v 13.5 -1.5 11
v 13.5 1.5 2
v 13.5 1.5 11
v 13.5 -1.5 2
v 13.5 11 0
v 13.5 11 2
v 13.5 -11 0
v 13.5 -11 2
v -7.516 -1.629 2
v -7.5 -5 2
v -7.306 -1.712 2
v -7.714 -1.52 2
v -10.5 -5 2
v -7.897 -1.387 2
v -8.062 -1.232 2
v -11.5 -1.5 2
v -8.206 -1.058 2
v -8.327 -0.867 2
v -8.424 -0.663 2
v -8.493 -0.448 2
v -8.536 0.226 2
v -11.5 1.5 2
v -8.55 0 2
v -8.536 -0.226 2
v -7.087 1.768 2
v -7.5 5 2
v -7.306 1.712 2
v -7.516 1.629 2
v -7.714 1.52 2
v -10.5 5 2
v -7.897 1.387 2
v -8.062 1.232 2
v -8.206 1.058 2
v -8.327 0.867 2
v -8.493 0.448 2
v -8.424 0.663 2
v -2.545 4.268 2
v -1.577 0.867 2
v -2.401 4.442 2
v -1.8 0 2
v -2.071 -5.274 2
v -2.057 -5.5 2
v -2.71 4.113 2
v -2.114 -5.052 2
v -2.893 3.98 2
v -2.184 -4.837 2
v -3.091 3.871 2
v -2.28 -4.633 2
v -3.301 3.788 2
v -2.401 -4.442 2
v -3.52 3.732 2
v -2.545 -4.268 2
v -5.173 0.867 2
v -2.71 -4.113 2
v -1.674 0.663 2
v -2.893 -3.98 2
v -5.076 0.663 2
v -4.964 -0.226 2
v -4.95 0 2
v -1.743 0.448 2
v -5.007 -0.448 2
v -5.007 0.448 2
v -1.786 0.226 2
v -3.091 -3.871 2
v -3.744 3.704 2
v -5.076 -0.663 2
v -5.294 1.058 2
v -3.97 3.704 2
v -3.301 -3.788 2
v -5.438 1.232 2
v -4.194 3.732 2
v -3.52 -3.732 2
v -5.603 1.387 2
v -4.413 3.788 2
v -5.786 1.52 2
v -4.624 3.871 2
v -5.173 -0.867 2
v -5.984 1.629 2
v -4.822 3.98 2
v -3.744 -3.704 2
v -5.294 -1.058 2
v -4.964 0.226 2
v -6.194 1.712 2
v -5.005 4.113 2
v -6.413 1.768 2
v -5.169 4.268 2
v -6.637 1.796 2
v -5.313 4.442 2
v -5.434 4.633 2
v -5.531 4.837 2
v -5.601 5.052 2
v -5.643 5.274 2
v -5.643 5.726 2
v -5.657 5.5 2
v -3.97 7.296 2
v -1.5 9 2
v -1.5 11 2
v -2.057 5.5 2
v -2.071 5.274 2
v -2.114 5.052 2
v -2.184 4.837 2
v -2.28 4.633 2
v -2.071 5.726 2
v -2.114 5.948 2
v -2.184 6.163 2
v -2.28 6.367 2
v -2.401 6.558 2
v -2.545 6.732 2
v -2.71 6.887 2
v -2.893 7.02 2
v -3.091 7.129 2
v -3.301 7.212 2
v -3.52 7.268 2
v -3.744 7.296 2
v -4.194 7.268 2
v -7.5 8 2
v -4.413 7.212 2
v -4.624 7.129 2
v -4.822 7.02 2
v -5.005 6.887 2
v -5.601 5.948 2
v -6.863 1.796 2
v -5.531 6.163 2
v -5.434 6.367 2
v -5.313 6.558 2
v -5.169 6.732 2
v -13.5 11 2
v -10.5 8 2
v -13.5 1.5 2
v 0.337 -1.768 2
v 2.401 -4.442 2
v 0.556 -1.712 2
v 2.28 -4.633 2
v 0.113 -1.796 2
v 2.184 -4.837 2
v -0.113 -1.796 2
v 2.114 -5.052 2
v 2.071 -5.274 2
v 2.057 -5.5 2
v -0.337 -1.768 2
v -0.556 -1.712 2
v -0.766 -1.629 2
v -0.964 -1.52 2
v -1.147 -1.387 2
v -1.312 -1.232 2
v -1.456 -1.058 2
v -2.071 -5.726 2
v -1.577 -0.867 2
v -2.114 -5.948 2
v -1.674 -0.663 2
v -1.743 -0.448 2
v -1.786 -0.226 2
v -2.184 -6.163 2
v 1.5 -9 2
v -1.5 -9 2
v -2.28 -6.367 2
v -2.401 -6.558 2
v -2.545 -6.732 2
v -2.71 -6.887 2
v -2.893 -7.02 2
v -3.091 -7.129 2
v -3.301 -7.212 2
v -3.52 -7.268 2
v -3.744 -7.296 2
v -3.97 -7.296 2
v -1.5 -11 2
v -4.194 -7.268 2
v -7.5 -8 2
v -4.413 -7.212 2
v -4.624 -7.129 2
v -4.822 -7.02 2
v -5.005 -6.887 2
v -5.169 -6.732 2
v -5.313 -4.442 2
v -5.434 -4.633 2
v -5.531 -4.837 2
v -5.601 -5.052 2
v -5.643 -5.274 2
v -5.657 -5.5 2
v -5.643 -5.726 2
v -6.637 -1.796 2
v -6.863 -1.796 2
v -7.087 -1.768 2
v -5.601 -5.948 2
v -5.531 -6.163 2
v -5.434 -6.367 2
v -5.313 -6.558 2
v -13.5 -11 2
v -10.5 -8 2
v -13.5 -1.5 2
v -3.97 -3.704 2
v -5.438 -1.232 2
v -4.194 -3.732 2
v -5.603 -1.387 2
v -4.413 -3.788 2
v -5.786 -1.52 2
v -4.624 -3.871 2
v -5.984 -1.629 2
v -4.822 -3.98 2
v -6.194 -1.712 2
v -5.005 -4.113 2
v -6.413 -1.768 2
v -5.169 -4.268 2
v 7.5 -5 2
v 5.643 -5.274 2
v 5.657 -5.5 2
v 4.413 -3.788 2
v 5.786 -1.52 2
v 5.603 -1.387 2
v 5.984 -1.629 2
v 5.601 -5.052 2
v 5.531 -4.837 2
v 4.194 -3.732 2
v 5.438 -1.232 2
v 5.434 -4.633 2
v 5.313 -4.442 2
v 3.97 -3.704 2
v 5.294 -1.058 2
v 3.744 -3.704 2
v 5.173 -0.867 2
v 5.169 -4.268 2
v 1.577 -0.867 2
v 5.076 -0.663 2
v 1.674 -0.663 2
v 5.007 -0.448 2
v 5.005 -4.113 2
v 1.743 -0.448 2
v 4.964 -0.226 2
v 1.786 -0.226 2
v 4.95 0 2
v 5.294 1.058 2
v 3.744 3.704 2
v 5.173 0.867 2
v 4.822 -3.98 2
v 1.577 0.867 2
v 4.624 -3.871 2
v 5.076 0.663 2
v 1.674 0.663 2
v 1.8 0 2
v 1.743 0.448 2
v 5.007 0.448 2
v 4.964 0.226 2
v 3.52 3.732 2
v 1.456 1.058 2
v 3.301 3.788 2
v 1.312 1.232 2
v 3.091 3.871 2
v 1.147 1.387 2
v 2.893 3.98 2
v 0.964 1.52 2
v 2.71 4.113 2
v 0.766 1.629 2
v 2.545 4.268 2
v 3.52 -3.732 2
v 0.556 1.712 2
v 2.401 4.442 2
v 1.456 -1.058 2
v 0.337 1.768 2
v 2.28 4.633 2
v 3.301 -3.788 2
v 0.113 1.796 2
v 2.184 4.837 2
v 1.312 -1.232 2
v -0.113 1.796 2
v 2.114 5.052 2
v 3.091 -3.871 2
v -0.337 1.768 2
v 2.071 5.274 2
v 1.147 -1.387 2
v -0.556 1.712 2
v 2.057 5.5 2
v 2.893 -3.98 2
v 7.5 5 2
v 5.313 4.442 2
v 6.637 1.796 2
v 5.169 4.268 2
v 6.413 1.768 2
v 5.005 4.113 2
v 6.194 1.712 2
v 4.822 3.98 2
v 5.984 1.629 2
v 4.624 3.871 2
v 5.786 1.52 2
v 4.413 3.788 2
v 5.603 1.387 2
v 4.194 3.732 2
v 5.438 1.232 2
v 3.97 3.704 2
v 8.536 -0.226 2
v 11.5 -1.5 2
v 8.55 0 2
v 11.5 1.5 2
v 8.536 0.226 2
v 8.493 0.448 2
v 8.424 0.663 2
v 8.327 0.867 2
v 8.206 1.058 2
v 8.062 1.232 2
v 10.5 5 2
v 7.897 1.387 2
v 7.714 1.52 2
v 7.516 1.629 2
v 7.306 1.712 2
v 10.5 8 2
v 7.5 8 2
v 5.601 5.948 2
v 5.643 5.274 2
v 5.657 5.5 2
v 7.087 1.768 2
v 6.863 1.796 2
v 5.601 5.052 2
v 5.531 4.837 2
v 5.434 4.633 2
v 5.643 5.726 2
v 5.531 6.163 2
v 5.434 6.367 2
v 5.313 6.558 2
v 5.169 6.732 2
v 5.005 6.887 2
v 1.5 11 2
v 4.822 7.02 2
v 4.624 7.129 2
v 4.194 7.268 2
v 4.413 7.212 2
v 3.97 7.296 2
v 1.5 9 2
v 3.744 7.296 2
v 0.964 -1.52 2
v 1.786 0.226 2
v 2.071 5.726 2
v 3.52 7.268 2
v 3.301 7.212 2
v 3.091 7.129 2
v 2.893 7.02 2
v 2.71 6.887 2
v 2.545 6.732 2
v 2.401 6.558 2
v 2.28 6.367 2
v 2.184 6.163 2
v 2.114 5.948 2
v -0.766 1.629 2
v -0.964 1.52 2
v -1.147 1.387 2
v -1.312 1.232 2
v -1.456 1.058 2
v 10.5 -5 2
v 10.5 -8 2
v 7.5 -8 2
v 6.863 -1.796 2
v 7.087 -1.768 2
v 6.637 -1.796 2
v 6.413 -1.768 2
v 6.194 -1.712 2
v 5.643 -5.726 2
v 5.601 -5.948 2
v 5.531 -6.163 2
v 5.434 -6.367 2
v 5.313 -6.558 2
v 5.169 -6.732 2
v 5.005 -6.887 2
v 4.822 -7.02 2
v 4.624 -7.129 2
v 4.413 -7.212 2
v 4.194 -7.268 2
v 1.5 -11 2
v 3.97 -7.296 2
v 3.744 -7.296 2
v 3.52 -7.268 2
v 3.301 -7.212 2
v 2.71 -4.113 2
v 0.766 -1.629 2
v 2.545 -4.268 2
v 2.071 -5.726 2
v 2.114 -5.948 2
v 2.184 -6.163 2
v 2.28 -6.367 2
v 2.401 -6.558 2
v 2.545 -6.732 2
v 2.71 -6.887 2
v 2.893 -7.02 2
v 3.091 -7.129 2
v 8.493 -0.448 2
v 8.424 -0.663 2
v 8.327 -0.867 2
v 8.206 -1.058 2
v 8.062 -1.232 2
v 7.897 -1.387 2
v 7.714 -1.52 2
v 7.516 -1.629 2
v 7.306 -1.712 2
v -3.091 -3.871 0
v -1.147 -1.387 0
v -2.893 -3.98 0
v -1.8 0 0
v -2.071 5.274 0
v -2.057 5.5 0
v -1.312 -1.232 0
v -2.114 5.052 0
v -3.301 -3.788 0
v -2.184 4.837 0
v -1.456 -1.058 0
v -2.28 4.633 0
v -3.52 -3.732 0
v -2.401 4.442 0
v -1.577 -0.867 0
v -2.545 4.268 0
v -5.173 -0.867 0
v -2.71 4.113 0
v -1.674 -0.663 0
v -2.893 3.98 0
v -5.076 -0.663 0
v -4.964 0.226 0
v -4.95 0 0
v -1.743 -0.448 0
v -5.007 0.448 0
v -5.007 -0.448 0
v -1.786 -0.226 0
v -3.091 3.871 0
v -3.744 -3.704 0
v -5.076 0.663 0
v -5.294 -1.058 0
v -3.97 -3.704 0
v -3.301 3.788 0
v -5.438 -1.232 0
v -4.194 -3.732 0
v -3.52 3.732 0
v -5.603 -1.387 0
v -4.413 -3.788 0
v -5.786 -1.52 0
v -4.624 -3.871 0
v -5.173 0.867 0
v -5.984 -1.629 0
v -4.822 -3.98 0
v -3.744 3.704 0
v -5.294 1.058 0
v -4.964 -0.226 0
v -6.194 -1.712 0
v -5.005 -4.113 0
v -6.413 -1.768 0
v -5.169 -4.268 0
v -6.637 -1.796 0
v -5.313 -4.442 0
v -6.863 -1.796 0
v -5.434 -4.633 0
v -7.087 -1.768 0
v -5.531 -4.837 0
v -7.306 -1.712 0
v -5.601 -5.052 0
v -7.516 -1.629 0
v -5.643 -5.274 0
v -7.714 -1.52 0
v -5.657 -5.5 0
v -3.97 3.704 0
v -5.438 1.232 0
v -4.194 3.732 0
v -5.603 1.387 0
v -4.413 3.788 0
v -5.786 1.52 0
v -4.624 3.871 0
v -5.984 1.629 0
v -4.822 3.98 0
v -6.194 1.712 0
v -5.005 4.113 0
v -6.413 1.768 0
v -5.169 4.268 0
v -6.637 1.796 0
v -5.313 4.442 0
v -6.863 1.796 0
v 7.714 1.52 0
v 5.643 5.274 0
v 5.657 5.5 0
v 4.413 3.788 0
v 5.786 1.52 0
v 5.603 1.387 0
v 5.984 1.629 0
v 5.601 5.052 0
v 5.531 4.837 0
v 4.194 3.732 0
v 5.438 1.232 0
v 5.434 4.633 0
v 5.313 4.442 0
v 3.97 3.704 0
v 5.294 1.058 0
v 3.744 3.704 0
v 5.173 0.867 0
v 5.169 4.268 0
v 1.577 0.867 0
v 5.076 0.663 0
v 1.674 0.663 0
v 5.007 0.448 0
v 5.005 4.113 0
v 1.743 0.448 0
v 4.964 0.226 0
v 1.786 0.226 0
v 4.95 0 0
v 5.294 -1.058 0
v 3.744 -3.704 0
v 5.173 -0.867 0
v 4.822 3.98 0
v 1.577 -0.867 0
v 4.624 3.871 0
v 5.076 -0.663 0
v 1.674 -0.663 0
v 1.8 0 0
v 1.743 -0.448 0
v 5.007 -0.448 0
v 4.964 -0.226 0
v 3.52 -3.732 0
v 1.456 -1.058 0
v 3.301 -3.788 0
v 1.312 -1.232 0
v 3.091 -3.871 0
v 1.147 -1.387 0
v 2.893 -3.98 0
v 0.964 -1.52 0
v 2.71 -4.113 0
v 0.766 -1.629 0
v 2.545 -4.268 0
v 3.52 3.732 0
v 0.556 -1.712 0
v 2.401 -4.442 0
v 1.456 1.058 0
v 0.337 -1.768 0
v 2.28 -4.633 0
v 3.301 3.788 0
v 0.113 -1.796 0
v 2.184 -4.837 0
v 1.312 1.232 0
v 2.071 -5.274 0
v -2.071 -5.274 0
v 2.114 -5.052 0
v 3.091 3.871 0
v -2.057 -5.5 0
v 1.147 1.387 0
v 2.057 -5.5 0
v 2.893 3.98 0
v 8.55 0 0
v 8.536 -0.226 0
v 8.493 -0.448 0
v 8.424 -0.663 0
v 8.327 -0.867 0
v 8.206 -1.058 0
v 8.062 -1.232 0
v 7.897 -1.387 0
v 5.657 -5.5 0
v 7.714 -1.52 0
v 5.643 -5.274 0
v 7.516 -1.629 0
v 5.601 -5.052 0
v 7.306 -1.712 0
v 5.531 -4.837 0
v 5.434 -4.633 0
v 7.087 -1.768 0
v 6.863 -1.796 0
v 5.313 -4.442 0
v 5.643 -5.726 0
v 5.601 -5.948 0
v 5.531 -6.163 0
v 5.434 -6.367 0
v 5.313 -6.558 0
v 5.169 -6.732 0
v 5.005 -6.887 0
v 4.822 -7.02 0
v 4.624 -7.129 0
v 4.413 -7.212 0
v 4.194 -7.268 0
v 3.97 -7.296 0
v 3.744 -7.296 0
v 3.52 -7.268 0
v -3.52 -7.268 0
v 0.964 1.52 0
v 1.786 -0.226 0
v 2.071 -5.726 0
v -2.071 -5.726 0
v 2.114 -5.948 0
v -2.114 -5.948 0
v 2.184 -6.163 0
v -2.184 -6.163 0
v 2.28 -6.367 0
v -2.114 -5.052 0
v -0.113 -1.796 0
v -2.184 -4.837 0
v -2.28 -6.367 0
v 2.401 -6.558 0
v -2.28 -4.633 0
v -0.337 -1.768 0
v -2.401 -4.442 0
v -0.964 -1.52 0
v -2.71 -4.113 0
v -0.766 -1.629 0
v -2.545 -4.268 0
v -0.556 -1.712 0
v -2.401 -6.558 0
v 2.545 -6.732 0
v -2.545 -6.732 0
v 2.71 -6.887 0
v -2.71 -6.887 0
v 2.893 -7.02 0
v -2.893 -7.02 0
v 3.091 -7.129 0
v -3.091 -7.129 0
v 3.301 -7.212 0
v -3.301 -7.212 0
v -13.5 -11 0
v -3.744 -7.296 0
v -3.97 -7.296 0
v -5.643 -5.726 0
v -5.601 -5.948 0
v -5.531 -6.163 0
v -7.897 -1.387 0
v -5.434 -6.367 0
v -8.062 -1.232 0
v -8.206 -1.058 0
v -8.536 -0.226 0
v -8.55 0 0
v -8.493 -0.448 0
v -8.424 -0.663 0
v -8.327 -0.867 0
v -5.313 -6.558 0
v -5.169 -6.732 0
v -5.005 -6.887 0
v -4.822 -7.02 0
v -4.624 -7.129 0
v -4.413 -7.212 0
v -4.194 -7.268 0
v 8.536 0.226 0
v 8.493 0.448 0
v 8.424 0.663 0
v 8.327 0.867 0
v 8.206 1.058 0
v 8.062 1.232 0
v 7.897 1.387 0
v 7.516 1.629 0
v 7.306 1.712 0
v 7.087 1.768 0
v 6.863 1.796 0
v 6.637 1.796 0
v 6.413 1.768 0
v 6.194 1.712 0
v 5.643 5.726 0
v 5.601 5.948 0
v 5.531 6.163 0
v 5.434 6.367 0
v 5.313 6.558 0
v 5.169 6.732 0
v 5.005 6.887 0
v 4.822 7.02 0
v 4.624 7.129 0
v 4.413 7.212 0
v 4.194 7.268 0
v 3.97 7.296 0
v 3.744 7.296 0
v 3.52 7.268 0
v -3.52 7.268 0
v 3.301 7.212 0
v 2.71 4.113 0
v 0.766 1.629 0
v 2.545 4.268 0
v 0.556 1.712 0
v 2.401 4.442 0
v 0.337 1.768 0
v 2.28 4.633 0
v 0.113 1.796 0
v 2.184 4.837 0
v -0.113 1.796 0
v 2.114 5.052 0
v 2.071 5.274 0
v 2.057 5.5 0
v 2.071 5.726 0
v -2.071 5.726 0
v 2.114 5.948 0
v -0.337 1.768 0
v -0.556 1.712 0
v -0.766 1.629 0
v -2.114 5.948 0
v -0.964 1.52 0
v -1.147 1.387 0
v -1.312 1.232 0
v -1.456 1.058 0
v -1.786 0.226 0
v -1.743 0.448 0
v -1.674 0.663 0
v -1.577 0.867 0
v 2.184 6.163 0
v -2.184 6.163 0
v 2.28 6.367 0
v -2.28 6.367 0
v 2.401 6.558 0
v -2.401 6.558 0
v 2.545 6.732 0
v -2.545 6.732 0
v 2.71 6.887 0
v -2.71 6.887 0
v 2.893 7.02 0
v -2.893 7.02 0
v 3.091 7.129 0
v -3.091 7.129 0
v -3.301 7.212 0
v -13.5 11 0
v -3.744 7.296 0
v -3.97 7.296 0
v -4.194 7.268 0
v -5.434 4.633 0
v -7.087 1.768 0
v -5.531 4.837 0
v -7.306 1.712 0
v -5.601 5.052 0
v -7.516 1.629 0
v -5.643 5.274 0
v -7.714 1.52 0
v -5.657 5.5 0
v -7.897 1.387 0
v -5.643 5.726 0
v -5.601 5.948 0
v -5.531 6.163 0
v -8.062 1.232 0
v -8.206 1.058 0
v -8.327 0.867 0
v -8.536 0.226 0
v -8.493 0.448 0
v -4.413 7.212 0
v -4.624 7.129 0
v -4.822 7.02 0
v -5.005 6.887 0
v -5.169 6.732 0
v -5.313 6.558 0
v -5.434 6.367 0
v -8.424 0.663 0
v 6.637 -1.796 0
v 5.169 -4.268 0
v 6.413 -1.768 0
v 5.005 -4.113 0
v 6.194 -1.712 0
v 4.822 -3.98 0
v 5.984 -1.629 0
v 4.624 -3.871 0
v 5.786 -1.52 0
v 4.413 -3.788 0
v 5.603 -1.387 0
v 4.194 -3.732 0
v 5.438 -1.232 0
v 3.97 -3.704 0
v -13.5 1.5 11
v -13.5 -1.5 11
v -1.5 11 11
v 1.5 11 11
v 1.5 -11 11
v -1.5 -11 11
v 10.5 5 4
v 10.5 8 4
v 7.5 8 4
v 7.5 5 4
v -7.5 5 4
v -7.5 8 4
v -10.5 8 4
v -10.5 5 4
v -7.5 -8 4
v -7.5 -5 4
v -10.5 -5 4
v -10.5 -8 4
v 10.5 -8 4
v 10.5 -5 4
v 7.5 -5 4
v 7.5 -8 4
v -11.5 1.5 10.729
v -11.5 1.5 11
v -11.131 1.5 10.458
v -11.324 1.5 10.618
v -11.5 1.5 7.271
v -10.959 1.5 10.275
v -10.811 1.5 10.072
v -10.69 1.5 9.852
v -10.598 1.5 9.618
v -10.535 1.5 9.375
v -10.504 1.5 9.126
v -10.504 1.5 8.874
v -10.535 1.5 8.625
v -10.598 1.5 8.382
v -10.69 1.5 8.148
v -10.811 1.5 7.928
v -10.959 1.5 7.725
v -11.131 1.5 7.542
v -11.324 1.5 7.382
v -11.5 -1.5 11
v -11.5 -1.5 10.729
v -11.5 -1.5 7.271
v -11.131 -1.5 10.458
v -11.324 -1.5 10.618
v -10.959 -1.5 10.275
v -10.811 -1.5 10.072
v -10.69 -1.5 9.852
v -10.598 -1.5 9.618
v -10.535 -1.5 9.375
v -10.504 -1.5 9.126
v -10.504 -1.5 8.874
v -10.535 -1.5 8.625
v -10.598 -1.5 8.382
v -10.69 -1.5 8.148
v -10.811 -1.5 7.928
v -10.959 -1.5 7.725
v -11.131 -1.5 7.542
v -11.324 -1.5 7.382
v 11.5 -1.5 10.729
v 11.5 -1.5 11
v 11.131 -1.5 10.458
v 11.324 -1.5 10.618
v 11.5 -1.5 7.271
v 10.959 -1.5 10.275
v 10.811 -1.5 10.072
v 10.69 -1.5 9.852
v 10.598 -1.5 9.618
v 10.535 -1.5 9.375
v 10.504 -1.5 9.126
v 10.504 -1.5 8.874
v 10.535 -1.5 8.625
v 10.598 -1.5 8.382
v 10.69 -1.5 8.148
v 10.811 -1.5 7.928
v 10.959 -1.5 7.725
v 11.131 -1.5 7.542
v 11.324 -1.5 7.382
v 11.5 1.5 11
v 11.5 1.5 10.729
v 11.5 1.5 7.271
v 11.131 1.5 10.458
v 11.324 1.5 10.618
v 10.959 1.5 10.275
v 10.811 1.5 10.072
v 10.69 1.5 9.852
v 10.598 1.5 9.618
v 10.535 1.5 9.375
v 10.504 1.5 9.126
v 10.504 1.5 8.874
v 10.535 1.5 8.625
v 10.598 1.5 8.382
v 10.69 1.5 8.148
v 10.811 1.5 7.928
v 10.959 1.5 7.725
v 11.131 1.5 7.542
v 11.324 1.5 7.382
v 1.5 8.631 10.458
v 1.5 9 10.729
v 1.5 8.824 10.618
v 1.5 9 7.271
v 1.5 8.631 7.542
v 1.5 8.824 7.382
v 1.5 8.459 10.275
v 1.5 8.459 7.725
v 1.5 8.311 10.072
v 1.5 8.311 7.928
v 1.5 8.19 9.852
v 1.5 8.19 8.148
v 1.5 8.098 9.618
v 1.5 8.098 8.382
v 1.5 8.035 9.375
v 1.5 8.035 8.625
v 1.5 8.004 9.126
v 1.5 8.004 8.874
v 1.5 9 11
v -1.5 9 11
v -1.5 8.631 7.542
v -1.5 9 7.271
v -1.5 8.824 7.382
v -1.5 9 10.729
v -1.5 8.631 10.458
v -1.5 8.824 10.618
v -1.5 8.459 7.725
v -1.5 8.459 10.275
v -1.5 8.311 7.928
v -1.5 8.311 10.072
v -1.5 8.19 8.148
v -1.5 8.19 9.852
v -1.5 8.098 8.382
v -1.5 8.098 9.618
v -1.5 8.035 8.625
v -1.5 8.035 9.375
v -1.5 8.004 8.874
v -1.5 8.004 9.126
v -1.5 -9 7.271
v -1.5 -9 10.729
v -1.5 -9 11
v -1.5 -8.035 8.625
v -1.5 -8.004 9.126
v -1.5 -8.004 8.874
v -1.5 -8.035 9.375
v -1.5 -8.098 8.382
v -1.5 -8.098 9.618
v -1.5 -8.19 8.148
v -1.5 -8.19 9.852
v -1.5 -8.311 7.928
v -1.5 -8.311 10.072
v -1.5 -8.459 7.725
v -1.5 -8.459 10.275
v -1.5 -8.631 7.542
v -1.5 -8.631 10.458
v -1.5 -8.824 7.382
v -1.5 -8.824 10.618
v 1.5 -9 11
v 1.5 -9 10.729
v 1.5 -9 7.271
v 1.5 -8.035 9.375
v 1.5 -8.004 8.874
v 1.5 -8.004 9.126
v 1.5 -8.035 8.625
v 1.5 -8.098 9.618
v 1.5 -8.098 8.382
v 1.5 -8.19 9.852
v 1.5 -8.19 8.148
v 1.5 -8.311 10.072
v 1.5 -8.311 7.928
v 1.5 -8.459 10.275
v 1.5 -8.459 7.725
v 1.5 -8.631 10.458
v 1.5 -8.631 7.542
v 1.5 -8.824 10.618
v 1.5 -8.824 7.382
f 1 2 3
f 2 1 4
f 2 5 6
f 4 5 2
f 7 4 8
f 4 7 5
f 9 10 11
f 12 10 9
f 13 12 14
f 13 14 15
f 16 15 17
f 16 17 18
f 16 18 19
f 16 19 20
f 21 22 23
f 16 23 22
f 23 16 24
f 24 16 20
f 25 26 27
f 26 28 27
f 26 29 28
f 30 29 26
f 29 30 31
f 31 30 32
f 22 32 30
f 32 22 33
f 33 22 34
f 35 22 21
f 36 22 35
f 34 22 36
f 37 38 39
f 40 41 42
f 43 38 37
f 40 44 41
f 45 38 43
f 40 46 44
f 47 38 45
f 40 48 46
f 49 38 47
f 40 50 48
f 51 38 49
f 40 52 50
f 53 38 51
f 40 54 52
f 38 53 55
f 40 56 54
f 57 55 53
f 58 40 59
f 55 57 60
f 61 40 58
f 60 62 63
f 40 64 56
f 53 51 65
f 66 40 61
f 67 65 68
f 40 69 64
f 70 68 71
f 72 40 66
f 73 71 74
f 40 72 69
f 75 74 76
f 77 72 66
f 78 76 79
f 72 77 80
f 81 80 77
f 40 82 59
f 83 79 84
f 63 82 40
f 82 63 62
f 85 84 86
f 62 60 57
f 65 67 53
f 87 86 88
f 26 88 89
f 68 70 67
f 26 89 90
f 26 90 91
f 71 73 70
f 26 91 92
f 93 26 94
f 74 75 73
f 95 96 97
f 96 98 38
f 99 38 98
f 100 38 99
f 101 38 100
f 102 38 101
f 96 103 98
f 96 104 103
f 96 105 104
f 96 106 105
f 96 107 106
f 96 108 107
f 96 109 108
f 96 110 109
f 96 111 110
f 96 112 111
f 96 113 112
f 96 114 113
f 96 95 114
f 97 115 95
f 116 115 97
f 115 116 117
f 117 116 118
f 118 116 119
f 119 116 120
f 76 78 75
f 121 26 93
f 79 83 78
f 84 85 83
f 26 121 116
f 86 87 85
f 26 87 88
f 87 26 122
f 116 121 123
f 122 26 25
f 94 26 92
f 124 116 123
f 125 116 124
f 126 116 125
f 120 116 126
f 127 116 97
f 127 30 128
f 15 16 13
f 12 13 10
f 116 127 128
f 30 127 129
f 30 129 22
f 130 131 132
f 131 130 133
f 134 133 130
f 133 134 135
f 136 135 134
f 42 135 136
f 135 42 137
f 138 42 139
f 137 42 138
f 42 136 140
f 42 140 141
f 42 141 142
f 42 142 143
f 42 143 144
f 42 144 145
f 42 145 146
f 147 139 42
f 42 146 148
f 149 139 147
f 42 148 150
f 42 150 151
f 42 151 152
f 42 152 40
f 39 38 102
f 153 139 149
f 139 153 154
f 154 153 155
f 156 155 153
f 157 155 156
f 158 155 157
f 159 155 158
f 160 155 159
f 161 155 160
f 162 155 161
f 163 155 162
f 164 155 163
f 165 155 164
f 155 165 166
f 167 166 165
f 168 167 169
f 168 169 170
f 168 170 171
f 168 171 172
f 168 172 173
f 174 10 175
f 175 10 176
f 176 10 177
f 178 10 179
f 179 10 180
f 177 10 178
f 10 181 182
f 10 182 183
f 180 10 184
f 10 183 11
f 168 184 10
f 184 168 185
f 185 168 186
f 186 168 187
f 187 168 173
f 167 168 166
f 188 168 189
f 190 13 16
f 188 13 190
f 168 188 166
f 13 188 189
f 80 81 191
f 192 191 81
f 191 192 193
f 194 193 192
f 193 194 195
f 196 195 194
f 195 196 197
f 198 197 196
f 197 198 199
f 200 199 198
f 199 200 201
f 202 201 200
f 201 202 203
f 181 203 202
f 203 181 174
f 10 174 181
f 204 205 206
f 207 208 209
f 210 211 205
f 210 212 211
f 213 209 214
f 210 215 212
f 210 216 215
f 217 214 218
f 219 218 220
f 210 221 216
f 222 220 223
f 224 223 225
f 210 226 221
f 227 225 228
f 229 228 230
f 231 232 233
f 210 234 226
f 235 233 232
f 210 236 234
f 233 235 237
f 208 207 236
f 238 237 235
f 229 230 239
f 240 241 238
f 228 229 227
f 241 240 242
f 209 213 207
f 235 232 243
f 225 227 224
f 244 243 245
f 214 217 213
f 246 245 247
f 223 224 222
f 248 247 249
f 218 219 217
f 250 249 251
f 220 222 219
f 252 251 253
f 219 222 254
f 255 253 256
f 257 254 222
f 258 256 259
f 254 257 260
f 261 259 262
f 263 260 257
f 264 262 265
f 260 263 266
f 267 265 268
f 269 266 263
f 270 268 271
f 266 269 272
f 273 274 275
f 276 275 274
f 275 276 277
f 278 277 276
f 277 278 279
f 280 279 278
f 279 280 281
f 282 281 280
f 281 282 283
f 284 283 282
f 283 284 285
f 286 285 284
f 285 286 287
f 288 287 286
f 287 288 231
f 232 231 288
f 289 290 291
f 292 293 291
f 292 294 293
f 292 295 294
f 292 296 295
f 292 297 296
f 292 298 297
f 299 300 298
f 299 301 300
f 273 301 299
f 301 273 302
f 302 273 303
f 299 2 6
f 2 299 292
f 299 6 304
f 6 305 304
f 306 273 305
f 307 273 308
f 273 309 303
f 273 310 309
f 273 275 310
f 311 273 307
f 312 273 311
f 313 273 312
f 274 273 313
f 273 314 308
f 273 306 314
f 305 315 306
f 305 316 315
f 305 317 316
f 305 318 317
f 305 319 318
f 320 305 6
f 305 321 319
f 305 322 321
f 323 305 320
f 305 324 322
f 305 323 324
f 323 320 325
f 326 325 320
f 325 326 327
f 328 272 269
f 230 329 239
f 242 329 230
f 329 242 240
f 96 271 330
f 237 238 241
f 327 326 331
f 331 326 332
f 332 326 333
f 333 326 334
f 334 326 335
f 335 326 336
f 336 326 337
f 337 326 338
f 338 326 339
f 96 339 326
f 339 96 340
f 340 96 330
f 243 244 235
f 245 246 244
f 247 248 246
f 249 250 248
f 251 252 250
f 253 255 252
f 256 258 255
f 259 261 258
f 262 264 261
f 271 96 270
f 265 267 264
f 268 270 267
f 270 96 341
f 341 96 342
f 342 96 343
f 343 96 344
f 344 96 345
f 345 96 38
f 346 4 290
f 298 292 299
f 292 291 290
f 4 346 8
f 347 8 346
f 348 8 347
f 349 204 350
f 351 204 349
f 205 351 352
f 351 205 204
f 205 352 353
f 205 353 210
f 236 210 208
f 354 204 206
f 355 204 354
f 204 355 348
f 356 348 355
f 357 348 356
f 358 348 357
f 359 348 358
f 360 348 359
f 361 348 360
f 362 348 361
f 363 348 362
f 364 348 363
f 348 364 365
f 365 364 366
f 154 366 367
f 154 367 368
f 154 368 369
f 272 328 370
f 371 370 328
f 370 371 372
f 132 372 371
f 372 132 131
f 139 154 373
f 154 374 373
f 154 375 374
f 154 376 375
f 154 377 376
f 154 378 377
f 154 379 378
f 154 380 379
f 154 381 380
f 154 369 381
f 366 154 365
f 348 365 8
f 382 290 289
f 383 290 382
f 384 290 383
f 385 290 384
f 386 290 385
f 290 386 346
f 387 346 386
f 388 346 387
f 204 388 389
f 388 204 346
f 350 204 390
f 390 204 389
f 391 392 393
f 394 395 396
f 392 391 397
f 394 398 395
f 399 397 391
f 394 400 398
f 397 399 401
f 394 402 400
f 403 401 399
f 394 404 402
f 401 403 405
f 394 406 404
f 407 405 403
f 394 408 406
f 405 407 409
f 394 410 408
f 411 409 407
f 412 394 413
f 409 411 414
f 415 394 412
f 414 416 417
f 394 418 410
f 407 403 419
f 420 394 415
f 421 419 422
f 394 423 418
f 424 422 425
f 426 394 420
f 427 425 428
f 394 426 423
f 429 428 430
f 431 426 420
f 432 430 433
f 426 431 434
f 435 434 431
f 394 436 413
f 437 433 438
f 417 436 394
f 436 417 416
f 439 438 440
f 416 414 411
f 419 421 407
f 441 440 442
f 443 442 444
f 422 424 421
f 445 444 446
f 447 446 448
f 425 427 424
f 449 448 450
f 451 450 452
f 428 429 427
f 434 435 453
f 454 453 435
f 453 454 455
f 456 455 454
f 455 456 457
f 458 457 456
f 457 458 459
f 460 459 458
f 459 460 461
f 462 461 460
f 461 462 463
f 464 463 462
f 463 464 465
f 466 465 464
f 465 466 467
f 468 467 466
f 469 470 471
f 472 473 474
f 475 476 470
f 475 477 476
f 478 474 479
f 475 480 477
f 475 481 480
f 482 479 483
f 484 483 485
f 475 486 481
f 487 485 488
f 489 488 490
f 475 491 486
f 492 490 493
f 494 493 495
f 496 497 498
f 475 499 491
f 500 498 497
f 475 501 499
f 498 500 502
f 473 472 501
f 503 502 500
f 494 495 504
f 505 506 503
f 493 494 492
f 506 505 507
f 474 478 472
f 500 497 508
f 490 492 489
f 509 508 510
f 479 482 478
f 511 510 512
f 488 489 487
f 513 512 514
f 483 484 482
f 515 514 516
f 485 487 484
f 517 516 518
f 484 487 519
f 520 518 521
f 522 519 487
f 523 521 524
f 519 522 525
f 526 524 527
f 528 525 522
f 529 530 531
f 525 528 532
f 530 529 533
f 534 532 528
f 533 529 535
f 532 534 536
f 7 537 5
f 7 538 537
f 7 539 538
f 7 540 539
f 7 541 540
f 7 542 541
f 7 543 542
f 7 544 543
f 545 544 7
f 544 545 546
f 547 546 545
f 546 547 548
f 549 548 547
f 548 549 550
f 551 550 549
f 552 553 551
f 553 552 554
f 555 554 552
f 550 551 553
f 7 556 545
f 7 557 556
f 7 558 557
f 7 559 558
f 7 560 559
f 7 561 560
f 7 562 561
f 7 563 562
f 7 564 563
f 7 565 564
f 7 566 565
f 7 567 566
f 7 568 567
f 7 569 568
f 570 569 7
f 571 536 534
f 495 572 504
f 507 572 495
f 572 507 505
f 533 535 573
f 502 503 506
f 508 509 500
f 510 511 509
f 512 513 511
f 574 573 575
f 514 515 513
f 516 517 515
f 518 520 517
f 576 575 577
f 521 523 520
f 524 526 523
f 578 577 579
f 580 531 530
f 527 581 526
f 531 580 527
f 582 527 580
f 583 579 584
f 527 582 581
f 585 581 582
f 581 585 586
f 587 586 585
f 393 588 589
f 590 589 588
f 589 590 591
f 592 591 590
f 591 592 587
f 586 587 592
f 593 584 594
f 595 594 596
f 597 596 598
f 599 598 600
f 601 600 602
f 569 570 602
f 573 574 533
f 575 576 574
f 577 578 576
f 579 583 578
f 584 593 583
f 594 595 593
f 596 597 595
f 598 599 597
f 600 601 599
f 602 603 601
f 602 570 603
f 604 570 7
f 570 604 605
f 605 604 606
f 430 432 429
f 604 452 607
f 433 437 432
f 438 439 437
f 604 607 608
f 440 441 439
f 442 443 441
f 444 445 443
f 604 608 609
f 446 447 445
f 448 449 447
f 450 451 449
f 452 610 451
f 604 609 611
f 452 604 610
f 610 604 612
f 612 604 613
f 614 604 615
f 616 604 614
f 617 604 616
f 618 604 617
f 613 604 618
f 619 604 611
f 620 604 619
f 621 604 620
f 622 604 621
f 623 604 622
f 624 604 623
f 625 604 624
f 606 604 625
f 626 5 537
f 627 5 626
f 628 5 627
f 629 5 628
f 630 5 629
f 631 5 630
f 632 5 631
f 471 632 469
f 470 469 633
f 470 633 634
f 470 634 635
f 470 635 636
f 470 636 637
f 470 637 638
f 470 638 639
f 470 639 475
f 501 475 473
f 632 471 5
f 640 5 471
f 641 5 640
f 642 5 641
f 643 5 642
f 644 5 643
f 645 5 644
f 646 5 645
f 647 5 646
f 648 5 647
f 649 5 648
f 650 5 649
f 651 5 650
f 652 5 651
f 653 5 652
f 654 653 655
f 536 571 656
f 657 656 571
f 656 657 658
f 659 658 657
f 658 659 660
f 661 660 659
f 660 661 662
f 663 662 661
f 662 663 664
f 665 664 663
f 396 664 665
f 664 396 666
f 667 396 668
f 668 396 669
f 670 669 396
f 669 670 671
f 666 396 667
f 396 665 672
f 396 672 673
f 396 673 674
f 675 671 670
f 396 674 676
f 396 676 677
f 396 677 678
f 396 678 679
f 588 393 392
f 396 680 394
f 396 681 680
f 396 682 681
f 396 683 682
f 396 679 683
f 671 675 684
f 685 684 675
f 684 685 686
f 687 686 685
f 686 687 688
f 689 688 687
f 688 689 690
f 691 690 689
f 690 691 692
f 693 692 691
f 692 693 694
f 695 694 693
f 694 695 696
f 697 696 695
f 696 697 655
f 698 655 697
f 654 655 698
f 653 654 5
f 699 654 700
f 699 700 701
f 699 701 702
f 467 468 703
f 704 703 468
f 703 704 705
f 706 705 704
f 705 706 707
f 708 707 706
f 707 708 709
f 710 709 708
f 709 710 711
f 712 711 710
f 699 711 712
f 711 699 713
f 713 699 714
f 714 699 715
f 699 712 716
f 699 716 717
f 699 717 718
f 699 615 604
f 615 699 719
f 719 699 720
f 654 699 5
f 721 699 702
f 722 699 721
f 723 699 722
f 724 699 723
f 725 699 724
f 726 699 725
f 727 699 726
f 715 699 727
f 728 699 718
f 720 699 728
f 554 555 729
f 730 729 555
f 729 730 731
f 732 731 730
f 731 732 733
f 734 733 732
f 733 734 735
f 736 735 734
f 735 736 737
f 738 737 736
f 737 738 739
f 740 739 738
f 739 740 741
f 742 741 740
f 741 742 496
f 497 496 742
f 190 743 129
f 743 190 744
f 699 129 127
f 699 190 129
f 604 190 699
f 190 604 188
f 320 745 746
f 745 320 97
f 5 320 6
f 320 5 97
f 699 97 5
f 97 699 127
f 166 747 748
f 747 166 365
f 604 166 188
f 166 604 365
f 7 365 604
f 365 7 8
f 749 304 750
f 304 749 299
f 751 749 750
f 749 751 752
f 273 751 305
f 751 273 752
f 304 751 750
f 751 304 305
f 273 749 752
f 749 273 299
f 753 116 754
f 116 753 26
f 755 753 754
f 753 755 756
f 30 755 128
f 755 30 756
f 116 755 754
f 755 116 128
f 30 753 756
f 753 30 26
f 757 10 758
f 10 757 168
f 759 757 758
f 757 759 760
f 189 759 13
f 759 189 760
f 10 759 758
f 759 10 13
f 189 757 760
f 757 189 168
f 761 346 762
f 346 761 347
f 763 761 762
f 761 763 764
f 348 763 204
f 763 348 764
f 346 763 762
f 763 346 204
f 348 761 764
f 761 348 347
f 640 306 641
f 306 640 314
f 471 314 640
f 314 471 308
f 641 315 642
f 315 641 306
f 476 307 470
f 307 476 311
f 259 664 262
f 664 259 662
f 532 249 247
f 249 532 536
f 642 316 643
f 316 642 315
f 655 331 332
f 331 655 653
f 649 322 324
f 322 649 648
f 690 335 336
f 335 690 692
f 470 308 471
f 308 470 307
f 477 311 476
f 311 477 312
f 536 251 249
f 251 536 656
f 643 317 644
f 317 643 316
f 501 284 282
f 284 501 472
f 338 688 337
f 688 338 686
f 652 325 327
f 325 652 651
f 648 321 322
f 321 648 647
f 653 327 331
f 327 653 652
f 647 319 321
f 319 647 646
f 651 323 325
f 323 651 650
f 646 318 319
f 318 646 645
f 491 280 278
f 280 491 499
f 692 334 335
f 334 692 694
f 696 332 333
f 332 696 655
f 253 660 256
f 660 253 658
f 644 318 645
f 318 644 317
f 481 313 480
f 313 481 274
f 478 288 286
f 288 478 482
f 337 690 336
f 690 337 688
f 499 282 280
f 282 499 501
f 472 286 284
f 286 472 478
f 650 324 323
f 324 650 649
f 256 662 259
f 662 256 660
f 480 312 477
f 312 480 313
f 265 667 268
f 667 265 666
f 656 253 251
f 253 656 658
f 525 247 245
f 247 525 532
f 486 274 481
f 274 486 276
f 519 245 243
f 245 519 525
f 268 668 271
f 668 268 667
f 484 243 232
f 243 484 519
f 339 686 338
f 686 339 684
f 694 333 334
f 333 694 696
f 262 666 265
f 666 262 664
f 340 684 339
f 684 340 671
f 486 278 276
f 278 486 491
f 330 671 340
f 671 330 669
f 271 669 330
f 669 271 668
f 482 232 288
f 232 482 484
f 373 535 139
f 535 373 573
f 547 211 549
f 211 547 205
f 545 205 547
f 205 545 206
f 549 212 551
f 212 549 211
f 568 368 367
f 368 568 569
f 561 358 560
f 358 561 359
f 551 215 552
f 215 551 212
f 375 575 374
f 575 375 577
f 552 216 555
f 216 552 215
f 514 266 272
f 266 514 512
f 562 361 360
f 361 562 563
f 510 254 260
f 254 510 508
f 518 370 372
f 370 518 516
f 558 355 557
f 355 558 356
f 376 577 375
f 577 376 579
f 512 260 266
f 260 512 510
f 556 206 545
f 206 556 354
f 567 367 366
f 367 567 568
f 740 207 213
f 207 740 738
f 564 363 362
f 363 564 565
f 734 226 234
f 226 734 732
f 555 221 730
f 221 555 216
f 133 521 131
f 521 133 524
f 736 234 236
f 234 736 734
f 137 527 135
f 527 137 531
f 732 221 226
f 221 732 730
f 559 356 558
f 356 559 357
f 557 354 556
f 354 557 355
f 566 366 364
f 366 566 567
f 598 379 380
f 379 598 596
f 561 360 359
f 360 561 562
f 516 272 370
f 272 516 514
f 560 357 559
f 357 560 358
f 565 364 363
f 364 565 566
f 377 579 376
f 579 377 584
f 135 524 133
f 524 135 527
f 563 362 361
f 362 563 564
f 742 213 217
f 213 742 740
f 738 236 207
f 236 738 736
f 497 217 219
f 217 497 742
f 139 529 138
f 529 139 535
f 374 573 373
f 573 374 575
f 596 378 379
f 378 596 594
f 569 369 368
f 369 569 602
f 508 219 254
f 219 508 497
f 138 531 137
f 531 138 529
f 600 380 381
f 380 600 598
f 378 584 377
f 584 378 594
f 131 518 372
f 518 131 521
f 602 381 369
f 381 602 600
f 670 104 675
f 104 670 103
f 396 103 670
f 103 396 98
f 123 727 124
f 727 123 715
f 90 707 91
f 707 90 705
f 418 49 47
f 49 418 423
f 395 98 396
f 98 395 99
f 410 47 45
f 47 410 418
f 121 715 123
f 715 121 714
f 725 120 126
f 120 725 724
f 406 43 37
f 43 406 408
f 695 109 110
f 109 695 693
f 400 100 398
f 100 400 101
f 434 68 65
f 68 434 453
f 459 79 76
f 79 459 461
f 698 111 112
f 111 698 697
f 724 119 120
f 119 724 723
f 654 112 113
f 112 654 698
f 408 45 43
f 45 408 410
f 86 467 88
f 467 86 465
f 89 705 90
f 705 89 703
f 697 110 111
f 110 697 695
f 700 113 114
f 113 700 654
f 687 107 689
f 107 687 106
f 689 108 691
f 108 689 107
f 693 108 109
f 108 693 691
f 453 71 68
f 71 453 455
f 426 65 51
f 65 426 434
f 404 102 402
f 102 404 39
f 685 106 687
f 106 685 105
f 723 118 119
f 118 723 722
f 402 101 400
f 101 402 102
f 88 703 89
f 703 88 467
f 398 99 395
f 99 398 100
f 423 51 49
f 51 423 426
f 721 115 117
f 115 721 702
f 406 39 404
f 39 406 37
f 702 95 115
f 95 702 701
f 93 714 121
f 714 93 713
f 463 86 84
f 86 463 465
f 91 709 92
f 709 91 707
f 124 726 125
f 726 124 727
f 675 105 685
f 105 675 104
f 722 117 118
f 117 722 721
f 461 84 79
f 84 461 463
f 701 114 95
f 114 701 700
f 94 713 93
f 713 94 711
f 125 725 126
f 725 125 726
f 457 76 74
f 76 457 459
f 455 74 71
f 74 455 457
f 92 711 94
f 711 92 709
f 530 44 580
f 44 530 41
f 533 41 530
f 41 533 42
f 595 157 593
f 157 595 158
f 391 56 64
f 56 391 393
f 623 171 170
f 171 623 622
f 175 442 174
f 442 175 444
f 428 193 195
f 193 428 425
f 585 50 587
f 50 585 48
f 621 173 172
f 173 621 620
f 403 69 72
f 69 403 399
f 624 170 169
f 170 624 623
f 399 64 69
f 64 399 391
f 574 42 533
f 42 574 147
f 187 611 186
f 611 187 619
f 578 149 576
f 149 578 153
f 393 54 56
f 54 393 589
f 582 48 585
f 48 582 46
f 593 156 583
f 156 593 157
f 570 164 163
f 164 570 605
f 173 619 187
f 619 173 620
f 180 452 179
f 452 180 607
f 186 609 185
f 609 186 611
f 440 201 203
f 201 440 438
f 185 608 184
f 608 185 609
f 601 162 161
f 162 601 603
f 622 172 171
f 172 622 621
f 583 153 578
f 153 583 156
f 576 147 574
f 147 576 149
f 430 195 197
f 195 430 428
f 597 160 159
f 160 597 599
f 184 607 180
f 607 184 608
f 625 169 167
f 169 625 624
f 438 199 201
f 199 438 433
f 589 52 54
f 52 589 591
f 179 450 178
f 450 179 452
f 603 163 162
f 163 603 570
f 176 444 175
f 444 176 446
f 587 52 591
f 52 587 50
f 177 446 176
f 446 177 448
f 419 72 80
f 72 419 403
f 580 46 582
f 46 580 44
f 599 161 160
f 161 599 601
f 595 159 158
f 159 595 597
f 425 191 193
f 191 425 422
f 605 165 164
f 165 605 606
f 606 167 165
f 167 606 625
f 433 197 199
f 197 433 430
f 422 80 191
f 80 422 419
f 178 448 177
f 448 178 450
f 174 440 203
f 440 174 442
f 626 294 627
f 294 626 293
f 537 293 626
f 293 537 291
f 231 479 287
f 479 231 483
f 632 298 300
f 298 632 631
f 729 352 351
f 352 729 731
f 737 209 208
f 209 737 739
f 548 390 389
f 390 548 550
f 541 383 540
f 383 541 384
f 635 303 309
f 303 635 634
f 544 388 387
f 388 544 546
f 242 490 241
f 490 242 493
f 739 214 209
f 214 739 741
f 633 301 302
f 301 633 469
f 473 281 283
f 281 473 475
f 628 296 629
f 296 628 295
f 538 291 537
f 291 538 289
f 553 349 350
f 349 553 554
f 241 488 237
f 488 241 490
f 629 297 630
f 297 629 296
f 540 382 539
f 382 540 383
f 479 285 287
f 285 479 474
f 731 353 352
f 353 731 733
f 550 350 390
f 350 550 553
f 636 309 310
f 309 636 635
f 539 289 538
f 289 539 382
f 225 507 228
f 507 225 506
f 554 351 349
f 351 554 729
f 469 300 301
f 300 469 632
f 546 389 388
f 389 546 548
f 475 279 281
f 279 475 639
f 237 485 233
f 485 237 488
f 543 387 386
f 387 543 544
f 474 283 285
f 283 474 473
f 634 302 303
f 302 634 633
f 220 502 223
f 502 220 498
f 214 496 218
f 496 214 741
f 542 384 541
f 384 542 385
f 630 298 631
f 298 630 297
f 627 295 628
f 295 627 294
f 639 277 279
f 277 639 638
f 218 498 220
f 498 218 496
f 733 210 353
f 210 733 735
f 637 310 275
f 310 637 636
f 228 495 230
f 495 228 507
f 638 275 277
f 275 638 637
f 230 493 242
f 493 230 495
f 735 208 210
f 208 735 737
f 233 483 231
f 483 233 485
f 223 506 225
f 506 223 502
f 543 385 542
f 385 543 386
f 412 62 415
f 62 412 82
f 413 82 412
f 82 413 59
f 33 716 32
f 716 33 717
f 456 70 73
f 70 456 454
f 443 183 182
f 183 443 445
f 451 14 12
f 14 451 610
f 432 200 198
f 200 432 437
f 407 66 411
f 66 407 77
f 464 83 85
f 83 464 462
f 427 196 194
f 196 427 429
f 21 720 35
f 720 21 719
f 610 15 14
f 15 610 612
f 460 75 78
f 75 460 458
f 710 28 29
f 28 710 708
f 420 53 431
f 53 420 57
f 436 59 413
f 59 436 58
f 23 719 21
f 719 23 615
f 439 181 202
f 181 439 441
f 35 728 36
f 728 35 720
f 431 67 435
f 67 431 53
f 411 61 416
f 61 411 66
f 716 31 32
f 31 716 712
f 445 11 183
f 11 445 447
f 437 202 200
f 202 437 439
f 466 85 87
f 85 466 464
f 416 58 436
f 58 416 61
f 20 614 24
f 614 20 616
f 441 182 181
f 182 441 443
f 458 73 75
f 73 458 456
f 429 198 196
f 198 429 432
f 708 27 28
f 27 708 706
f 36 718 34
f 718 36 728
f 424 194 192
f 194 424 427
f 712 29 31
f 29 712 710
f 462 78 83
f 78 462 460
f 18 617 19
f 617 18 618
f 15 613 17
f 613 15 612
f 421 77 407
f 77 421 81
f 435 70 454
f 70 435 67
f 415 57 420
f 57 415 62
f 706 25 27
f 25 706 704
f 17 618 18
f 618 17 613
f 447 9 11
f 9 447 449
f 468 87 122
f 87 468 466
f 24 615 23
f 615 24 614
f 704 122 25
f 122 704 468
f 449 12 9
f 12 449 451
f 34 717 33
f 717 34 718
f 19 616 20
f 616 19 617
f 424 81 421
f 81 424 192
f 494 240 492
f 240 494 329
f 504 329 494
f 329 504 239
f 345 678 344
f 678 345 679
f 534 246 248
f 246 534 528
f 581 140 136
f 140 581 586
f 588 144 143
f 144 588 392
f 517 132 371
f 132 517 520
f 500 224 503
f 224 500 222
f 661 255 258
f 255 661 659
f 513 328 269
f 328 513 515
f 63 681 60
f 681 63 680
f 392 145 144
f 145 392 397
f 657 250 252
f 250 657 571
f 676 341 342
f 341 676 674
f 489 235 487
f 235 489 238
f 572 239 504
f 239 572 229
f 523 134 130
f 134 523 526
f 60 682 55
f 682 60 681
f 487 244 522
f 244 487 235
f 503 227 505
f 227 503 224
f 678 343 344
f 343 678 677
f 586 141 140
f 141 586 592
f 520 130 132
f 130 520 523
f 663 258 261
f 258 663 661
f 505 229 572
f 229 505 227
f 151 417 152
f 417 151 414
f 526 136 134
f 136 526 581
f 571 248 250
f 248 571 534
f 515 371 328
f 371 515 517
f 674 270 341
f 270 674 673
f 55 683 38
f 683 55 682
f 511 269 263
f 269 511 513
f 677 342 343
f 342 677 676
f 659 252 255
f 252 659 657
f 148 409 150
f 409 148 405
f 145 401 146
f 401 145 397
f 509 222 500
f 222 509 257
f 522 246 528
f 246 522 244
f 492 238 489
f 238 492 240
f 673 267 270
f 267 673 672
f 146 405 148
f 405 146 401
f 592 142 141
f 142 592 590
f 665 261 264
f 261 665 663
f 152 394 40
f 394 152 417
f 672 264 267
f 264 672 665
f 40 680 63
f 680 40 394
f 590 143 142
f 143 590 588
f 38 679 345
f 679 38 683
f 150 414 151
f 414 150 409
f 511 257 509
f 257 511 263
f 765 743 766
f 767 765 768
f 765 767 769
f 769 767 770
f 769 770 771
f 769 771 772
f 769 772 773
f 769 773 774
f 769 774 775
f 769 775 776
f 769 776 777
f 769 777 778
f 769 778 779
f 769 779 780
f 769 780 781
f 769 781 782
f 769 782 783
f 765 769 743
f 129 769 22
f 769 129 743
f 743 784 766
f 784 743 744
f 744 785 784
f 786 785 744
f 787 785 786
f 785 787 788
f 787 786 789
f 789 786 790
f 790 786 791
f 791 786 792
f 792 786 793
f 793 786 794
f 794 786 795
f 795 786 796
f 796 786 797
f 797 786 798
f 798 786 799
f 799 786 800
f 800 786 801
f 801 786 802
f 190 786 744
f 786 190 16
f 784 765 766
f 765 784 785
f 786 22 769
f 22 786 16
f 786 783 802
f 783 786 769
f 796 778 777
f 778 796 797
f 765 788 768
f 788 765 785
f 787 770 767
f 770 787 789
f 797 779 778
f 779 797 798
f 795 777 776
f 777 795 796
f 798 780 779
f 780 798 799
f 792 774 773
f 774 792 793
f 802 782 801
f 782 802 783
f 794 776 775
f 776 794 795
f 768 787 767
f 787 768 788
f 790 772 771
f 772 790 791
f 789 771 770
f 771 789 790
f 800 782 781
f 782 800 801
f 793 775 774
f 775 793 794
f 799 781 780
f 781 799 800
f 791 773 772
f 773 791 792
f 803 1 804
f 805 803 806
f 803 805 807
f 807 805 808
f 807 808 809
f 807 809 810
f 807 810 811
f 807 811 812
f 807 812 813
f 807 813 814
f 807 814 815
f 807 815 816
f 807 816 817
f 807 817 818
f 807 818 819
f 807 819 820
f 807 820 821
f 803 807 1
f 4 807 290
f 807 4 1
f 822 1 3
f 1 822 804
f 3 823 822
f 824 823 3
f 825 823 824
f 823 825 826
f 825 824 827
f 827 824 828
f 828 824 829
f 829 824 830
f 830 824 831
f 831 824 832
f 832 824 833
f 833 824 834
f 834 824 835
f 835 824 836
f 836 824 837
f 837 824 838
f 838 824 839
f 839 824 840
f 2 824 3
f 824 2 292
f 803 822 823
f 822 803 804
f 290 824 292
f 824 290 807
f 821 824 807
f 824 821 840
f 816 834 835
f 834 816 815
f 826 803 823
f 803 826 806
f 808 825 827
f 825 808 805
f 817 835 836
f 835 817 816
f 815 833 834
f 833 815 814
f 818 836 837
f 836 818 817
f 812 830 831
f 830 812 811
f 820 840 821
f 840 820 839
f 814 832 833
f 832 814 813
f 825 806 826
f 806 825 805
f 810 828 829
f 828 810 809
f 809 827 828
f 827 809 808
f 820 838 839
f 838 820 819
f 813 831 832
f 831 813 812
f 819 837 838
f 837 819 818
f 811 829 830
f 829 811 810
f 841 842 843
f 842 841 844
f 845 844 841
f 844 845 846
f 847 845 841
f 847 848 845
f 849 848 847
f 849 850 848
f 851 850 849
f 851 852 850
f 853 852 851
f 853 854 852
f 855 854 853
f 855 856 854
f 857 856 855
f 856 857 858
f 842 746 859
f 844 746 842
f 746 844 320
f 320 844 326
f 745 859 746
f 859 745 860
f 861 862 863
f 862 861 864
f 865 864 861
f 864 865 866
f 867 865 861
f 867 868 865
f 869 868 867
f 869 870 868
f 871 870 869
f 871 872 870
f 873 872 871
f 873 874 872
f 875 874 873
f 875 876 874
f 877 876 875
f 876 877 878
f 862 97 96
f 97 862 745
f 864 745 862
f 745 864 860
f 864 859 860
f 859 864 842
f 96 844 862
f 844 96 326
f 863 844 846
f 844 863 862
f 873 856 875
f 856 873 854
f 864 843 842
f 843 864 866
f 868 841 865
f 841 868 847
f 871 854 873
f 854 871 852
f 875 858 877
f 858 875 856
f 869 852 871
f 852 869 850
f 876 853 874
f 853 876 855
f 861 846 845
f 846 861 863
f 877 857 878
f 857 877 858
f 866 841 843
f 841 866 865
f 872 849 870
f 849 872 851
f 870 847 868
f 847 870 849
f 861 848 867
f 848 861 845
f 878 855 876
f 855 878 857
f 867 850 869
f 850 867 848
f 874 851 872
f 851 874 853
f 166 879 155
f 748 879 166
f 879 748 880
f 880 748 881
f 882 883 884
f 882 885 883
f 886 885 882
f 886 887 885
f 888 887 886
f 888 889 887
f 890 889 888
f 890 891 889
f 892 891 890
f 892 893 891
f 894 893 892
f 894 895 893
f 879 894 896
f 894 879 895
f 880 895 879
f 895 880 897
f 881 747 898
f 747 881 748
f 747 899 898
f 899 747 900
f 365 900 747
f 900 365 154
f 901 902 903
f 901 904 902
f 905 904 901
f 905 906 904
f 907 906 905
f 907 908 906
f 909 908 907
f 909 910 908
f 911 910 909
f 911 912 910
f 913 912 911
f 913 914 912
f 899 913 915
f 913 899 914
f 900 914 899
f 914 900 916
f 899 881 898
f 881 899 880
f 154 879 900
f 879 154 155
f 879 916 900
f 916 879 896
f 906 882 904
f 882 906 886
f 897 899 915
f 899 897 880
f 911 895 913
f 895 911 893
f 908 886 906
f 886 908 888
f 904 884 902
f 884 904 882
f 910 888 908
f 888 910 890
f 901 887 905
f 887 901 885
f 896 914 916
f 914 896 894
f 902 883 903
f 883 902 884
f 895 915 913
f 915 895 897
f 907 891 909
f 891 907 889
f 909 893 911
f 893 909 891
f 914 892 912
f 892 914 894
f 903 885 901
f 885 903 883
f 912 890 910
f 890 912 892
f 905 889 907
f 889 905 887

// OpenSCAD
$fn = 50;
PIN_W = 3;
PIN_D = 2;
PIN_H = 11;
BASE_W = 24 + PIN_W;
BASE_D = 19 + PIN_W;
BASE_H = 2;
LOCK_R = 2;
LOCK_Z = PIN_H - LOCK_R;
STAND_W = 3;
STAND_D = 3;
STAND_H = 2;

module pin_lock() {
  difference() {
    union() {
      translate([0, 0, PIN_H/2]) {
        cube([PIN_W, PIN_D, PIN_H], center=true);
      }
      translate([0, 0, LOCK_Z]) {
        rotate([0, 90, 0]) {
          cylinder(r=LOCK_R, h=PIN_W, center=true);
        }
      }
    }
    translate([0, PIN_D, PIN_H/2]) {
      cube([PIN_W, PIN_D, PIN_H], center=true);
    }
  }
}

module hole3m() {
  cylinder(r=1.8, h=10, center=true);
}

module stand() {
  cube([STAND_W, STAND_D, STAND_H], center=false);
}

rotate([0, 0, $t*200]) {
  
difference() {
  translate([0, 0, 1]) {
    union() {
      cube([BASE_W, BASE_D, BASE_H], center=true);
      translate([BASE_W/2-STAND_W-PIN_W, BASE_D/2-STAND_D-PIN_W, 1]) {
        stand();
      }
      translate([-BASE_W/2+PIN_W, BASE_D/2-STAND_D-PIN_W, 1]) {
        stand();
      }
      translate([-BASE_W/2+PIN_W, -BASE_D/2+PIN_W, 1]) {
        stand();
      }
      translate([BASE_W/2-STAND_W-PIN_W, -BASE_D/2+PIN_W, 1]) {
        stand();
      }
    }
  }
  translate([BASE_W/7, BASE_D/4, 0]) {
    hole3m();
  }
  translate([BASE_W/7, -BASE_D/4, 0]) {
    hole3m();
  }
  translate([-BASE_W/7, BASE_D/4, 0]) {
    hole3m();
  }
  translate([-BASE_W/7, -BASE_D/4, 0]) {
    hole3m();
  }
  translate([BASE_W/4, 0, 0]) {
    hole3m();
  }
  translate([-BASE_W/4, 0, 0]) {
    hole3m();
  }
  translate([0, 0, 0]) {
    hole3m();
  }
}

translate([-(BASE_W/2+2-PIN_W), 0, 0]) {
  rotate([0, 0, 90]) {
    pin_lock();
  }
}

translate([(BASE_W/2+2-PIN_W), 0, 0]) {
  rotate([0, 0, 270]) {
    pin_lock();
  }
}

translate([0, (BASE_D/2+2-PIN_W), 0]) {
  rotate([0, 0, 0]) {
    pin_lock();
  }
}

translate([0, -(BASE_D/2+2-PIN_W), 0]) {
  rotate([0, 0, 180]) {
    pin_lock();
  }
}

}
